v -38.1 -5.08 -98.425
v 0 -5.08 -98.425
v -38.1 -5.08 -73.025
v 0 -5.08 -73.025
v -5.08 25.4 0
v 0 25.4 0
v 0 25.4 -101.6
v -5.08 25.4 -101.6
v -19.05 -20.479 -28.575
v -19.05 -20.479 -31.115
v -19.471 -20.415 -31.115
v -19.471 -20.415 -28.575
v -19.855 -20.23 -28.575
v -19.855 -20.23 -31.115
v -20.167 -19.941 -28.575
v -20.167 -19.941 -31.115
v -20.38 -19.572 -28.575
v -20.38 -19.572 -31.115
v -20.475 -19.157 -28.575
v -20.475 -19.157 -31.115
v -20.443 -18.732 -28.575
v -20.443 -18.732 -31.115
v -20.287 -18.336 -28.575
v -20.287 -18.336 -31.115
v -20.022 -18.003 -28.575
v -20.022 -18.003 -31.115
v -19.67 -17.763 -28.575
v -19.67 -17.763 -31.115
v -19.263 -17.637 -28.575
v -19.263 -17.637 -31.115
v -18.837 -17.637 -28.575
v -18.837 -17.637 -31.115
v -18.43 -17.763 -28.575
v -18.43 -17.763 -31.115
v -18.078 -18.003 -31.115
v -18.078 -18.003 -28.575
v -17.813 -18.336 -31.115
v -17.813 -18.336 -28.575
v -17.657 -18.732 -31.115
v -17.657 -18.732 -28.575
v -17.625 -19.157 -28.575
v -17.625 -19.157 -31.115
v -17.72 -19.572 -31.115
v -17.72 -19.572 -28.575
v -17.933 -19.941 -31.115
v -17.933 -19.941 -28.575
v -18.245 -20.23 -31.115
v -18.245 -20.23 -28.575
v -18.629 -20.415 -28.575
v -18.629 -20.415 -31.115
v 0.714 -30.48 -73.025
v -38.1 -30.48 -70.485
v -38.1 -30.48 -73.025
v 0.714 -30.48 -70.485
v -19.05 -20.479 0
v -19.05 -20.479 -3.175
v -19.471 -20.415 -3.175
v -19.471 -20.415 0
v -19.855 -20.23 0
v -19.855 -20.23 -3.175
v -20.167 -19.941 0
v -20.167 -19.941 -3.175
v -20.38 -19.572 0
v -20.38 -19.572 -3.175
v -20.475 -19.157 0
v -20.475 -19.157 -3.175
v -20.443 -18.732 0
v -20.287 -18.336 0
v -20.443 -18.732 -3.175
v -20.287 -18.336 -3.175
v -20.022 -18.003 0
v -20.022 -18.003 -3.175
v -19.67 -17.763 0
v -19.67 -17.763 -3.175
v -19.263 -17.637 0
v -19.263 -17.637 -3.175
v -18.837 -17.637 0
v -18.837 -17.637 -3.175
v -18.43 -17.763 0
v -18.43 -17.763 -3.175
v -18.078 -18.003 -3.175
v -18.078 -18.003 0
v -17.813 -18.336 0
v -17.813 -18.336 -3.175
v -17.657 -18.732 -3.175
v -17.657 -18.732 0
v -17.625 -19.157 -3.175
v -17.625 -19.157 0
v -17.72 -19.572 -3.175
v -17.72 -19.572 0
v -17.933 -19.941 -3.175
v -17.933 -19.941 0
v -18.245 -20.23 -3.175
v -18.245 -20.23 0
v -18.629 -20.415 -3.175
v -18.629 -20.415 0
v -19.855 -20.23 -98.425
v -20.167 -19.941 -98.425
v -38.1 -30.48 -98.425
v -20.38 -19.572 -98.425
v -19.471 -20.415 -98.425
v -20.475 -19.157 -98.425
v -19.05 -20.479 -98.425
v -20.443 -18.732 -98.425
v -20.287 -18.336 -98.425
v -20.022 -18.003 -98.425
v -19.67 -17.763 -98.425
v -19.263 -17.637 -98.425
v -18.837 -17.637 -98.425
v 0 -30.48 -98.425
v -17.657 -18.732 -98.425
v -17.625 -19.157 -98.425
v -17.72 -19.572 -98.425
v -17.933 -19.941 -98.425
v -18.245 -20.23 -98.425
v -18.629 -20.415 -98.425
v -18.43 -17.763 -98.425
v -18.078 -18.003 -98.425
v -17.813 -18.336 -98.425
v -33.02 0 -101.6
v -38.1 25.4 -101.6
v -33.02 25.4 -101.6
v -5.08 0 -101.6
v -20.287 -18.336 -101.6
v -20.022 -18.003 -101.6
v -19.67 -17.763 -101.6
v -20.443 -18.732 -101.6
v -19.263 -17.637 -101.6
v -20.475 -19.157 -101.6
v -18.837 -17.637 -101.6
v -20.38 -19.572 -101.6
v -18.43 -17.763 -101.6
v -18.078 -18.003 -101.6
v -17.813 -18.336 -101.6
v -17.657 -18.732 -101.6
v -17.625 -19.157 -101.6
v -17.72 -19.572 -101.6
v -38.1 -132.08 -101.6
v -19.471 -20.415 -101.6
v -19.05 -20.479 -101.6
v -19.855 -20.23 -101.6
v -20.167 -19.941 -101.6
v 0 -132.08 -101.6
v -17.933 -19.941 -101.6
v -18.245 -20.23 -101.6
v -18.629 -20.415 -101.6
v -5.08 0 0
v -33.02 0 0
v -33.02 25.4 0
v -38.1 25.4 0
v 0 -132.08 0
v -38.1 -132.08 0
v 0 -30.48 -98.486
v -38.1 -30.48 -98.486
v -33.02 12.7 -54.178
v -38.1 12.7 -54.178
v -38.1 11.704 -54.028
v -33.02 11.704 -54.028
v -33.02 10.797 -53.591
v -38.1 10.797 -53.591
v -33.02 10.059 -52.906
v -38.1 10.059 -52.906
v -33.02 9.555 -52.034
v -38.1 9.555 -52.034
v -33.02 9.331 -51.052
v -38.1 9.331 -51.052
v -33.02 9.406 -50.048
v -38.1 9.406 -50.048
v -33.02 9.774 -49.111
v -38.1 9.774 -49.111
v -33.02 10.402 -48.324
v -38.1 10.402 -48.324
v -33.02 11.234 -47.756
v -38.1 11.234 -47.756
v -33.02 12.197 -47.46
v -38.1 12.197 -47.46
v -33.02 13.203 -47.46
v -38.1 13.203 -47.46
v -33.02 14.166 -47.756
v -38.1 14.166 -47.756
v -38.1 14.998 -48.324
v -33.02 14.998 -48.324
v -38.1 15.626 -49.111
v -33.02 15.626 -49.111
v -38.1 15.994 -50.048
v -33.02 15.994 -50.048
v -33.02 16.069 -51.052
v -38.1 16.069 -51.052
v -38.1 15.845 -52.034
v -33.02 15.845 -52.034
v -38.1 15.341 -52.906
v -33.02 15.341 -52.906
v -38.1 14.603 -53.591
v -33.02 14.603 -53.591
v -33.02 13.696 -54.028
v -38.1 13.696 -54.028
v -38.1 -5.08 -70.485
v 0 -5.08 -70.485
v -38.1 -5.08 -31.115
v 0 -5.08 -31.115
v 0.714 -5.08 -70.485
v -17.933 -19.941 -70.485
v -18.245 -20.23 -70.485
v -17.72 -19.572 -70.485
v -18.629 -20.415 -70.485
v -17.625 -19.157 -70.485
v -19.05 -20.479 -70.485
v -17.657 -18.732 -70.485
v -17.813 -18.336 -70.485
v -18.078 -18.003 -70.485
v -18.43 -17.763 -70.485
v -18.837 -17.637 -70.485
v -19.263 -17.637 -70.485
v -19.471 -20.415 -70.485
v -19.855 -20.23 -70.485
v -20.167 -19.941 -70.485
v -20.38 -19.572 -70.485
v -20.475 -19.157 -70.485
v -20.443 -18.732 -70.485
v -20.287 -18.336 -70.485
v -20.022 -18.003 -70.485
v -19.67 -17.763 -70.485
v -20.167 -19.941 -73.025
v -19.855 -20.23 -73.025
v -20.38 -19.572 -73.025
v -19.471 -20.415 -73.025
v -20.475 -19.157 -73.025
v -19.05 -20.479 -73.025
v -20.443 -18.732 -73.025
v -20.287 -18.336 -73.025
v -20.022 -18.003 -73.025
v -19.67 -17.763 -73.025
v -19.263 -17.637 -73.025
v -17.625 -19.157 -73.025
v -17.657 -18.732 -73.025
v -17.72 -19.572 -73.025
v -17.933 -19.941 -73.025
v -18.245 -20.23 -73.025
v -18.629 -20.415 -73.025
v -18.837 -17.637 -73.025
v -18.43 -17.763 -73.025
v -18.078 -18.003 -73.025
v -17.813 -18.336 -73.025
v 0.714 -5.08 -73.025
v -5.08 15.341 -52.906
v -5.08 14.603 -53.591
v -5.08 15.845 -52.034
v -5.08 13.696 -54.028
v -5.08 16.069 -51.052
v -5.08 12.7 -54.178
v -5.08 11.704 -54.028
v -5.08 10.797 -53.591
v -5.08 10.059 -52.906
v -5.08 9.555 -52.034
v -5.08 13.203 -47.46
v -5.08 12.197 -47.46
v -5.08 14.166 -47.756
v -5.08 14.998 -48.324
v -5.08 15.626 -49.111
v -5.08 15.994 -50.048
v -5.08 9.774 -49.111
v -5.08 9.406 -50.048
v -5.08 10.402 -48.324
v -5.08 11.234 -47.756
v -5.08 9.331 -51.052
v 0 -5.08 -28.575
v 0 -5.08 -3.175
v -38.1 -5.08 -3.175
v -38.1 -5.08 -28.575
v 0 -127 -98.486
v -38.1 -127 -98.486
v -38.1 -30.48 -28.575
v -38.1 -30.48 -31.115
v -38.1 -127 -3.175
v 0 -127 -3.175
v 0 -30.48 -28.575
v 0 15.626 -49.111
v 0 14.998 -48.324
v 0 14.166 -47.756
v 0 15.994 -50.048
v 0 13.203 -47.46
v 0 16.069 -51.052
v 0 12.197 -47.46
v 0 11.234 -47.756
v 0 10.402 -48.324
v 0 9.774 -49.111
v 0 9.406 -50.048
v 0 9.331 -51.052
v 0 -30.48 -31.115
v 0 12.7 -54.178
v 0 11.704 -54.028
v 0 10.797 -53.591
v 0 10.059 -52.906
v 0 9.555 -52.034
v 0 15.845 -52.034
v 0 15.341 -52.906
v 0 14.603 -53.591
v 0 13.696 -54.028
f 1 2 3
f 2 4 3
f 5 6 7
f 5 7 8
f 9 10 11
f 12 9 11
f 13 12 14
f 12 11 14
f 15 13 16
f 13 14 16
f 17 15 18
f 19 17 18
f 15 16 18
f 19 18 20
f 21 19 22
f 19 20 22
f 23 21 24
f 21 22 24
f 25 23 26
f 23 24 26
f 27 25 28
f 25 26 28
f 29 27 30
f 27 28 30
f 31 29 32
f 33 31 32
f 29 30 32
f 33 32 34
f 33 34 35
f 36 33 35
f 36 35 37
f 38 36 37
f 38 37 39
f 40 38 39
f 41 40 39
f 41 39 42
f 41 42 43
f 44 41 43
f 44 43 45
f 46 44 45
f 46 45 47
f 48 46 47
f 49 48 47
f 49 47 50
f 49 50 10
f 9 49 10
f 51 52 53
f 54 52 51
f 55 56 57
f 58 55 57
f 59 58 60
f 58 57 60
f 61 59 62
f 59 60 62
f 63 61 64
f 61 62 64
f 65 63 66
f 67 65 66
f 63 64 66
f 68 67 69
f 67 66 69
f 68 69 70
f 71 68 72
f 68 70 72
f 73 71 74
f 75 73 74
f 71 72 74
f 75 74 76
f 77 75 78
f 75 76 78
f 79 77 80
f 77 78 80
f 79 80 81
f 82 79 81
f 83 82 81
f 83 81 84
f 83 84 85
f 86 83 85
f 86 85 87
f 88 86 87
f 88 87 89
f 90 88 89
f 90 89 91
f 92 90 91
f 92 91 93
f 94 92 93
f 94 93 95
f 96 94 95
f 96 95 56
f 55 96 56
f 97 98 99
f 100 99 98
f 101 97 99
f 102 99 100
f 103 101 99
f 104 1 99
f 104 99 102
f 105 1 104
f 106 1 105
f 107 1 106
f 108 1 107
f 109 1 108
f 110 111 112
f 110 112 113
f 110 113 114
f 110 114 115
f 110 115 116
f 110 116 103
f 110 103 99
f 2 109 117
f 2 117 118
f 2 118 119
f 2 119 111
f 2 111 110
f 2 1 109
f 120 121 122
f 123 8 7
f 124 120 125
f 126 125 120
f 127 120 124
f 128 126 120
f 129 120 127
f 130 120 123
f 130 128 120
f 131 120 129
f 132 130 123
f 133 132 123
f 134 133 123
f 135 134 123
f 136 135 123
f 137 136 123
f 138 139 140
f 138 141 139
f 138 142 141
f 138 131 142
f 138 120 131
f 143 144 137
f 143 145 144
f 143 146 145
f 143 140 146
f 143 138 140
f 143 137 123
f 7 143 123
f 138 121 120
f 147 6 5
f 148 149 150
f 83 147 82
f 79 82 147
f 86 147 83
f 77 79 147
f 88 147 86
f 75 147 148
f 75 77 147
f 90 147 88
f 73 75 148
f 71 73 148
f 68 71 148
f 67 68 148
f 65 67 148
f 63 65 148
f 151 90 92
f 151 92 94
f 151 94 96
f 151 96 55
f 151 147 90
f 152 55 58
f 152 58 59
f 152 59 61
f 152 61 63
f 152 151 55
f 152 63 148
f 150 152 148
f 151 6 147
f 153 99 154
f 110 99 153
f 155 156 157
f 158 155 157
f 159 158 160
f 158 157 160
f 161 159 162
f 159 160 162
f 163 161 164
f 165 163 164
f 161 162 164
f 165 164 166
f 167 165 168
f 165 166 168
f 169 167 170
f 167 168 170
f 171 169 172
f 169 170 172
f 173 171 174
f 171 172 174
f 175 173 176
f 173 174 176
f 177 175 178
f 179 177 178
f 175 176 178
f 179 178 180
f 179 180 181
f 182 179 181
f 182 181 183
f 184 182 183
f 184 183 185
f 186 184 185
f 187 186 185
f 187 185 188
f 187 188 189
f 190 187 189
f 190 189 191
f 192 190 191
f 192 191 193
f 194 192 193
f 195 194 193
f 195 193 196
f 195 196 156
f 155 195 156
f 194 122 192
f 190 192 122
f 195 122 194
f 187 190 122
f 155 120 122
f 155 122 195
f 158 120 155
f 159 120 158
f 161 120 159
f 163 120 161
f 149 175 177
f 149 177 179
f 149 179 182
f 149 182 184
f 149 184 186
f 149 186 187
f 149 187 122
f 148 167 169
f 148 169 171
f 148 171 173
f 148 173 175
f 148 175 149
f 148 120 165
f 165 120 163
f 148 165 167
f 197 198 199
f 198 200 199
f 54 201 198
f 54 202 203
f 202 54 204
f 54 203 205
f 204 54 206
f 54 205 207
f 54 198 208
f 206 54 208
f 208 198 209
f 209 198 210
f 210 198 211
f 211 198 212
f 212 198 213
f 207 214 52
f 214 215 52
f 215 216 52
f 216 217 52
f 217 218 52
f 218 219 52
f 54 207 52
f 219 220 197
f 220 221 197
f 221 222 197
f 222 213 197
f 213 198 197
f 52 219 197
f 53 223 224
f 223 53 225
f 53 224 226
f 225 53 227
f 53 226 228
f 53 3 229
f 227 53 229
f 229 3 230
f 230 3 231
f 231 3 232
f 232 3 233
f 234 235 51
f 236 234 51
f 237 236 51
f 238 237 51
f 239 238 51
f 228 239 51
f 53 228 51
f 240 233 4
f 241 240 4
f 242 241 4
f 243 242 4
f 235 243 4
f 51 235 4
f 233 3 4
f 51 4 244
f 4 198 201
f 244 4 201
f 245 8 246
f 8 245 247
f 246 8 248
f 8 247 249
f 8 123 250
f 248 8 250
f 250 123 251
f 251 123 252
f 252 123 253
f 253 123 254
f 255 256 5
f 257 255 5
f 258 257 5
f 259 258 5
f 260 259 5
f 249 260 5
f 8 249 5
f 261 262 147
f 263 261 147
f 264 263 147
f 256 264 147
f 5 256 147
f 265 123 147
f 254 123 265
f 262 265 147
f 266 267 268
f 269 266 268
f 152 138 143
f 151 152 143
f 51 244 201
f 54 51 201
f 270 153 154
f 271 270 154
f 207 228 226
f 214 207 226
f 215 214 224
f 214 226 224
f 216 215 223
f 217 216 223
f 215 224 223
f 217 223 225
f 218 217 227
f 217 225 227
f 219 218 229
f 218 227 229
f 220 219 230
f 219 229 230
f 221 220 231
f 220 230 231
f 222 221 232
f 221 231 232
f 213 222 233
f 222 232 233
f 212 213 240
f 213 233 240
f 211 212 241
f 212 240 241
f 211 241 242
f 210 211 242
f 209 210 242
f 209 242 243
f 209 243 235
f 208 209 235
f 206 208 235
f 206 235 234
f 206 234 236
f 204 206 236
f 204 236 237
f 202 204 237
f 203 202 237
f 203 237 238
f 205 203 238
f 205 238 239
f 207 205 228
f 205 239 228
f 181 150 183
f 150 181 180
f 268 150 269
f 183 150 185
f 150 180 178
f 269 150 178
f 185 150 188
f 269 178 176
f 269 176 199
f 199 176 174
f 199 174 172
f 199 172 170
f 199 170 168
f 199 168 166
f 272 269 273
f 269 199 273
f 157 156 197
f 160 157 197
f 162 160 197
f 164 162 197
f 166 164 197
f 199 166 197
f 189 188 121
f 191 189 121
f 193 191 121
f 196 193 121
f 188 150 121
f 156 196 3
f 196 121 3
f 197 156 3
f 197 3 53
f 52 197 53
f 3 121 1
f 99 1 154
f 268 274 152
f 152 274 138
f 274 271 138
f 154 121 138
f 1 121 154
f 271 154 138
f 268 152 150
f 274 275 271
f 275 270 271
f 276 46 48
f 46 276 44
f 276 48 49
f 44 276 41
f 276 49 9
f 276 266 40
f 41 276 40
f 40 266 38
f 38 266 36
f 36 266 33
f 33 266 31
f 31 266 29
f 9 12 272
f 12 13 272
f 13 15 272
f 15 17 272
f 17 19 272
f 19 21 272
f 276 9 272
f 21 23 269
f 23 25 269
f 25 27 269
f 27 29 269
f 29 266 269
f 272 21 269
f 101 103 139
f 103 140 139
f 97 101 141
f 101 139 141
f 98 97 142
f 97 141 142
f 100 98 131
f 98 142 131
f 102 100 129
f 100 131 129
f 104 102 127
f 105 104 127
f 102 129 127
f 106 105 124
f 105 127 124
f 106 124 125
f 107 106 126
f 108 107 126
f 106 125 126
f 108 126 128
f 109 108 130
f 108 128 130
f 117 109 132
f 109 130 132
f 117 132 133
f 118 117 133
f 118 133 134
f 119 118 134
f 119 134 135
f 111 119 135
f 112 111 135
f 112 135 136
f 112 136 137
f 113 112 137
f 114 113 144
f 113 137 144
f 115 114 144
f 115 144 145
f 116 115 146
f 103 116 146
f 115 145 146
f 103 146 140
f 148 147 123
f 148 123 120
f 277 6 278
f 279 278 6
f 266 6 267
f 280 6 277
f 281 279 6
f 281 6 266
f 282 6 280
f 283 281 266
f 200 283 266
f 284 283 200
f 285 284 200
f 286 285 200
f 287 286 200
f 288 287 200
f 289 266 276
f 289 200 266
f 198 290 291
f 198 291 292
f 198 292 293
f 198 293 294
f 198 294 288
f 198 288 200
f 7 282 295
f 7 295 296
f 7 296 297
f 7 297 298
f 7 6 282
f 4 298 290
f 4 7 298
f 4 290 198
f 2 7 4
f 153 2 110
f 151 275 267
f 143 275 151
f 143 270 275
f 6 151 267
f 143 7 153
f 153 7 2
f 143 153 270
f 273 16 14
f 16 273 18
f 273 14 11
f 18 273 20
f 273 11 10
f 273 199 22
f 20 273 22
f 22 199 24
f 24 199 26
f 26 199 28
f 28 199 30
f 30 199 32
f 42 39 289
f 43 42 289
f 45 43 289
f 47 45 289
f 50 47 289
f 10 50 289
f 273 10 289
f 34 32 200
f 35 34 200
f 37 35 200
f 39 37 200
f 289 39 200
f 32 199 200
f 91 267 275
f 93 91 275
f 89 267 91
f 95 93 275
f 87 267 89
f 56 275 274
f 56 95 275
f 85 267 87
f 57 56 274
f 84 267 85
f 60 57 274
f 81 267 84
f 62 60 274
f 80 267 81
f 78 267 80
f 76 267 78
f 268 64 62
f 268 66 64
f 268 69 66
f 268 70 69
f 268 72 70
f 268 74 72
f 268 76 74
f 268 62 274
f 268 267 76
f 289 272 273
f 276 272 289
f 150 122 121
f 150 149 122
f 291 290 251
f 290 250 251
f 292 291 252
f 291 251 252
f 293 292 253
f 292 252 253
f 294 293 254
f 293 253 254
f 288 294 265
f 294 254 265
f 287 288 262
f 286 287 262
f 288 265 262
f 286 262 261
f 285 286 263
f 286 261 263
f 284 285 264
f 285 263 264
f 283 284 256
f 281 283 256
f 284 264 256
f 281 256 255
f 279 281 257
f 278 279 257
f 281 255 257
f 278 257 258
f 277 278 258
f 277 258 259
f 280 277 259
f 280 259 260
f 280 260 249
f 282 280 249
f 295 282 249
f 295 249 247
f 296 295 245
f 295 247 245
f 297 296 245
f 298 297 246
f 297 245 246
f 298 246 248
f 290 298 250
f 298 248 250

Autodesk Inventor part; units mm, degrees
ref_plane "YZ Plane" through (0, 0, 0) normal (1, 0, 0) x (0, 1, 0)
ref_plane "XZ Plane" through (0, 0, 0) normal (0, 1, 0) x (-1, 0, 0)
ref_plane "XY Plane" through (0, 0, 0) normal (0, 0, 1) x (1, 0, 0)
sketch "Sketch1" plane through (0, 0, 0) normal (0, 1, 0) x (-1, 0, 0)
  line L0 (0, 0) -> (38.1, 0)
  line L1 (38.1, 0) -> (38.1, -101.6)
  line L2 (38.1, -101.6) -> (0, -101.6)
  line L3 (0, -101.6) -> (0, 0)
  line L4 (38.1, -101.6) -> (33.02, -101.6)
  line L5 (33.02, -101.6) -> (33.02, 0)
  line L6 (33.02, 0) -> (38.1, 0)
  line L7 (38.1, 0) -> (38.1, -101.6)
  line L8 (0, -101.6) -> (5.08, -101.6)
  line L9 (5.08, -101.6) -> (5.08, 0)
  line L10 (5.08, 0) -> (0, 0)
  line L11 (0, 0) -> (0, -101.6)
  dimension "d0" = 38.1
  dimension "d1" = 101.6
  dimension "d2" = 5.08
  dimension "d3" = 5.08
extrude "Extrusion1" add sketch "Sketch1" along normal blind 25.4 contours L0 L9 L2 L3 | L0 L1 L2 L5
extrude "Extrusion2" add sketch "Sketch1" against normal blind 5.08
sketch "Sketch2" plane through (0, 25.4, 0) normal (1, 0, 0) x (0, 0, -1)
  line L0 (101.6, 0) -> (0, 0) projected
  line L1 (50.8, 0) -> (50.8, -12.7)
  point P0 (0, -25.4)
  dimension "d8" = 12.7
hole "Hole1" at (0, 12.7, -50.8) direction (-1, 0, 0) diameter 6.7564 end through all clearance for "Socket Head Cap Screw" size "1/4" standard "Ansi Unified Screw Threads"
sketch "Sketch3" plane through (0, -5.08, 0) normal (0, -1, 0) x (1, 0, 0)
  line L0 (0, -101.6) -> (-5.08, -101.6) projected
  line L1 (0, -101.6) -> (0, -88.9)
  line L2 (0, 0) -> (0, -101.6) projected
  line L3 (0, -88.9) -> (0, -63.5)
  line L4 (0, -88.9) -> (-19.05, -88.9)
  line L5 (0, -63.5) -> (-19.05, -63.5)
  line L6 (-38.1, -101.6) -> (-38.1, 0) projected
  line L7 (0, -90.4875) -> (-38.1, -90.4875)
  line L8 (-38.1, -90.4875) -> (-38.1, -87.3125)
  line L9 (-38.1, -87.3125) -> (0, -87.3125)
  line L10 (0, -87.3125) -> (0, -90.4875)
  line L11 (0, -90.4875) -> (-38.1, -87.3125) construction
  line L12 (-38.1, -90.4875) -> (0, -87.3125) construction
  line L13 (0, -61.9125) -> (-38.1, -61.9125)
  line L14 (-38.1, -61.9125) -> (-38.1, -65.0875)
  line L15 (-38.1, -65.0875) -> (0, -65.0875)
  line L16 (0, -65.0875) -> (0, -61.9125)
  line L17 (0, -61.9125) -> (-38.1, -65.0875) construction
  line L18 (-38.1, -61.9125) -> (0, -65.0875) construction
  line L19 (-38.1, 0) -> (-38.1, -101.6) projected
  line L20 (-38.1, 0) -> (0, 0)
  line L21 (0, 0) -> (0, -3.175)
  line L22 (0, -3.175) -> (-38.1, -3.175)
  line L23 (-38.1, -3.175) -> (-38.1, 0)
  line L24 (0, -101.6) -> (-38.1, -101.6)
  line L25 (-38.1, -101.6) -> (-38.1, -98.425)
  line L26 (-38.1, -98.425) -> (0, -98.425)
  line L27 (0, -98.425) -> (0, -101.6)
  line L28 (0, -3.175) -> (0, -28.575)
  line L29 (-38.1, -98.425) -> (-38.1, -73.025)
  line L30 (-38.1, -98.425) -> (-12.7, -98.425) construction
  line L31 (0, -28.575) -> (-38.1, -28.575)
  line L32 (-38.1, -28.575) -> (-38.1, -31.115)
  line L33 (-38.1, -31.115) -> (0, -31.115)
  line L34 (0, -31.115) -> (0, -28.575)
  line L35 (-38.1, -73.025) -> (0.7144, -73.025)
  line L36 (0.7144, -73.025) -> (0.7144, -70.485)
  line L37 (0.7144, -70.485) -> (-38.1, -70.485)
  line L38 (-38.1, -70.485) -> (-38.1, -73.025)
  point P0 (0, -65.0875)
  point P1 (0, -61.9125)
  point P2 (0, -87.3125)
  point P3 (-38.1, -90.4875)
  point P4 (0, -90.4875)
  point P5 (0, -98.425)
  point P6 (-38.1, -98.425)
  point P7 (0, -31.115)
  dimension "d16" = 12.7
  dimension "d17" = 25.4
  dimension "d18" = 19.05
  dimension "d19" = 3.175
  dimension "d20" = 3.175
  dimension "d32" = 3.175
  dimension "d33" = 3.175
  dimension "d34" = 25.4
  dimension "d35" = 25.4
  dimension "d36" = 90
  dimension "d37" = 2.54
  dimension "d38" = 2.54
extrude "Extrusion3" add sketch "Sketch3" along normal blind 25.4 contours L0 L24 L6 L26 L1 | L35 L6 L37 L2 | L2 L37 L36 L35 | L6 L31 L2 L33 | L6 L20 L2 L22
sketch "Sketch4" plane through (-38.1, -5.08, 0) normal (0, 0, 1) x (1, 0, 0)
  line L0 (38.1, -25.4) -> (19.05, -25.4)
  line L1 (19.05, -25.4) -> (19.05, -13.97)
  point P0 (38.1, 5.08)
  dimension "d23" = 11.43
hole "Hole2" at (-19.05, -19.05, 0) direction (0, 0, -1) diameter 2.8575 end through all
sketch "Sketch5" plane through (0, -30.48, 0) normal (0, -1, 0) x (1, 0, 0)
  line L0 (-38.1, -3.175) -> (-38.1, -28.575) projected
  line L1 (0, 0) -> (-38.1, 0)
  line L2 (-38.1, 0) -> (-38.1, -3.175)
  line L3 (-38.1, -3.175) -> (0, -3.175)
  line L4 (0, -3.175) -> (0, 0)
  line L5 (-38.1, -101.6) -> (-38.1, 0) projected
  line L6 (0, 0) -> (0, -101.6) projected
  line L7 (-38.1, -101.6) -> (0, -101.6)
  line L8 (0, -101.6) -> (0, -98.4864)
  line L9 (0, -98.4864) -> (-38.1, -98.4864)
  line L10 (-38.1, -98.4864) -> (-38.1, -101.6)
extrude "Extrusion4" add sketch "Sketch5" along normal blind 101.6 contours L2 L1 L4 L3 | L9 L6 L7 L5
sketch "Sketch6" plane through (-38.1, -30.48, -98.4864) normal (0, 0, 1) x (1, 0, 0)
  line L0 (0, 55.88) -> (0, -101.6) projected
  line L1 (38.1, 0) -> (38.1, -101.6) projected
  line L2 (0, -101.6) -> (38.1, -101.6)
  line L3 (38.1, -101.6) -> (38.1, -96.52)
  line L4 (38.1, -96.52) -> (0, -96.52)
  line L5 (0, -96.52) -> (0, -101.6)
  point P0 (38.1, 30.48)
  dimension "d41" = 5.08
extrude "Extrusion5" add sketch "Sketch6" along normal blind 96.52
properties part number "Sample Holder end for 8020-thruhole-widestance-long-withoverheadcam"
